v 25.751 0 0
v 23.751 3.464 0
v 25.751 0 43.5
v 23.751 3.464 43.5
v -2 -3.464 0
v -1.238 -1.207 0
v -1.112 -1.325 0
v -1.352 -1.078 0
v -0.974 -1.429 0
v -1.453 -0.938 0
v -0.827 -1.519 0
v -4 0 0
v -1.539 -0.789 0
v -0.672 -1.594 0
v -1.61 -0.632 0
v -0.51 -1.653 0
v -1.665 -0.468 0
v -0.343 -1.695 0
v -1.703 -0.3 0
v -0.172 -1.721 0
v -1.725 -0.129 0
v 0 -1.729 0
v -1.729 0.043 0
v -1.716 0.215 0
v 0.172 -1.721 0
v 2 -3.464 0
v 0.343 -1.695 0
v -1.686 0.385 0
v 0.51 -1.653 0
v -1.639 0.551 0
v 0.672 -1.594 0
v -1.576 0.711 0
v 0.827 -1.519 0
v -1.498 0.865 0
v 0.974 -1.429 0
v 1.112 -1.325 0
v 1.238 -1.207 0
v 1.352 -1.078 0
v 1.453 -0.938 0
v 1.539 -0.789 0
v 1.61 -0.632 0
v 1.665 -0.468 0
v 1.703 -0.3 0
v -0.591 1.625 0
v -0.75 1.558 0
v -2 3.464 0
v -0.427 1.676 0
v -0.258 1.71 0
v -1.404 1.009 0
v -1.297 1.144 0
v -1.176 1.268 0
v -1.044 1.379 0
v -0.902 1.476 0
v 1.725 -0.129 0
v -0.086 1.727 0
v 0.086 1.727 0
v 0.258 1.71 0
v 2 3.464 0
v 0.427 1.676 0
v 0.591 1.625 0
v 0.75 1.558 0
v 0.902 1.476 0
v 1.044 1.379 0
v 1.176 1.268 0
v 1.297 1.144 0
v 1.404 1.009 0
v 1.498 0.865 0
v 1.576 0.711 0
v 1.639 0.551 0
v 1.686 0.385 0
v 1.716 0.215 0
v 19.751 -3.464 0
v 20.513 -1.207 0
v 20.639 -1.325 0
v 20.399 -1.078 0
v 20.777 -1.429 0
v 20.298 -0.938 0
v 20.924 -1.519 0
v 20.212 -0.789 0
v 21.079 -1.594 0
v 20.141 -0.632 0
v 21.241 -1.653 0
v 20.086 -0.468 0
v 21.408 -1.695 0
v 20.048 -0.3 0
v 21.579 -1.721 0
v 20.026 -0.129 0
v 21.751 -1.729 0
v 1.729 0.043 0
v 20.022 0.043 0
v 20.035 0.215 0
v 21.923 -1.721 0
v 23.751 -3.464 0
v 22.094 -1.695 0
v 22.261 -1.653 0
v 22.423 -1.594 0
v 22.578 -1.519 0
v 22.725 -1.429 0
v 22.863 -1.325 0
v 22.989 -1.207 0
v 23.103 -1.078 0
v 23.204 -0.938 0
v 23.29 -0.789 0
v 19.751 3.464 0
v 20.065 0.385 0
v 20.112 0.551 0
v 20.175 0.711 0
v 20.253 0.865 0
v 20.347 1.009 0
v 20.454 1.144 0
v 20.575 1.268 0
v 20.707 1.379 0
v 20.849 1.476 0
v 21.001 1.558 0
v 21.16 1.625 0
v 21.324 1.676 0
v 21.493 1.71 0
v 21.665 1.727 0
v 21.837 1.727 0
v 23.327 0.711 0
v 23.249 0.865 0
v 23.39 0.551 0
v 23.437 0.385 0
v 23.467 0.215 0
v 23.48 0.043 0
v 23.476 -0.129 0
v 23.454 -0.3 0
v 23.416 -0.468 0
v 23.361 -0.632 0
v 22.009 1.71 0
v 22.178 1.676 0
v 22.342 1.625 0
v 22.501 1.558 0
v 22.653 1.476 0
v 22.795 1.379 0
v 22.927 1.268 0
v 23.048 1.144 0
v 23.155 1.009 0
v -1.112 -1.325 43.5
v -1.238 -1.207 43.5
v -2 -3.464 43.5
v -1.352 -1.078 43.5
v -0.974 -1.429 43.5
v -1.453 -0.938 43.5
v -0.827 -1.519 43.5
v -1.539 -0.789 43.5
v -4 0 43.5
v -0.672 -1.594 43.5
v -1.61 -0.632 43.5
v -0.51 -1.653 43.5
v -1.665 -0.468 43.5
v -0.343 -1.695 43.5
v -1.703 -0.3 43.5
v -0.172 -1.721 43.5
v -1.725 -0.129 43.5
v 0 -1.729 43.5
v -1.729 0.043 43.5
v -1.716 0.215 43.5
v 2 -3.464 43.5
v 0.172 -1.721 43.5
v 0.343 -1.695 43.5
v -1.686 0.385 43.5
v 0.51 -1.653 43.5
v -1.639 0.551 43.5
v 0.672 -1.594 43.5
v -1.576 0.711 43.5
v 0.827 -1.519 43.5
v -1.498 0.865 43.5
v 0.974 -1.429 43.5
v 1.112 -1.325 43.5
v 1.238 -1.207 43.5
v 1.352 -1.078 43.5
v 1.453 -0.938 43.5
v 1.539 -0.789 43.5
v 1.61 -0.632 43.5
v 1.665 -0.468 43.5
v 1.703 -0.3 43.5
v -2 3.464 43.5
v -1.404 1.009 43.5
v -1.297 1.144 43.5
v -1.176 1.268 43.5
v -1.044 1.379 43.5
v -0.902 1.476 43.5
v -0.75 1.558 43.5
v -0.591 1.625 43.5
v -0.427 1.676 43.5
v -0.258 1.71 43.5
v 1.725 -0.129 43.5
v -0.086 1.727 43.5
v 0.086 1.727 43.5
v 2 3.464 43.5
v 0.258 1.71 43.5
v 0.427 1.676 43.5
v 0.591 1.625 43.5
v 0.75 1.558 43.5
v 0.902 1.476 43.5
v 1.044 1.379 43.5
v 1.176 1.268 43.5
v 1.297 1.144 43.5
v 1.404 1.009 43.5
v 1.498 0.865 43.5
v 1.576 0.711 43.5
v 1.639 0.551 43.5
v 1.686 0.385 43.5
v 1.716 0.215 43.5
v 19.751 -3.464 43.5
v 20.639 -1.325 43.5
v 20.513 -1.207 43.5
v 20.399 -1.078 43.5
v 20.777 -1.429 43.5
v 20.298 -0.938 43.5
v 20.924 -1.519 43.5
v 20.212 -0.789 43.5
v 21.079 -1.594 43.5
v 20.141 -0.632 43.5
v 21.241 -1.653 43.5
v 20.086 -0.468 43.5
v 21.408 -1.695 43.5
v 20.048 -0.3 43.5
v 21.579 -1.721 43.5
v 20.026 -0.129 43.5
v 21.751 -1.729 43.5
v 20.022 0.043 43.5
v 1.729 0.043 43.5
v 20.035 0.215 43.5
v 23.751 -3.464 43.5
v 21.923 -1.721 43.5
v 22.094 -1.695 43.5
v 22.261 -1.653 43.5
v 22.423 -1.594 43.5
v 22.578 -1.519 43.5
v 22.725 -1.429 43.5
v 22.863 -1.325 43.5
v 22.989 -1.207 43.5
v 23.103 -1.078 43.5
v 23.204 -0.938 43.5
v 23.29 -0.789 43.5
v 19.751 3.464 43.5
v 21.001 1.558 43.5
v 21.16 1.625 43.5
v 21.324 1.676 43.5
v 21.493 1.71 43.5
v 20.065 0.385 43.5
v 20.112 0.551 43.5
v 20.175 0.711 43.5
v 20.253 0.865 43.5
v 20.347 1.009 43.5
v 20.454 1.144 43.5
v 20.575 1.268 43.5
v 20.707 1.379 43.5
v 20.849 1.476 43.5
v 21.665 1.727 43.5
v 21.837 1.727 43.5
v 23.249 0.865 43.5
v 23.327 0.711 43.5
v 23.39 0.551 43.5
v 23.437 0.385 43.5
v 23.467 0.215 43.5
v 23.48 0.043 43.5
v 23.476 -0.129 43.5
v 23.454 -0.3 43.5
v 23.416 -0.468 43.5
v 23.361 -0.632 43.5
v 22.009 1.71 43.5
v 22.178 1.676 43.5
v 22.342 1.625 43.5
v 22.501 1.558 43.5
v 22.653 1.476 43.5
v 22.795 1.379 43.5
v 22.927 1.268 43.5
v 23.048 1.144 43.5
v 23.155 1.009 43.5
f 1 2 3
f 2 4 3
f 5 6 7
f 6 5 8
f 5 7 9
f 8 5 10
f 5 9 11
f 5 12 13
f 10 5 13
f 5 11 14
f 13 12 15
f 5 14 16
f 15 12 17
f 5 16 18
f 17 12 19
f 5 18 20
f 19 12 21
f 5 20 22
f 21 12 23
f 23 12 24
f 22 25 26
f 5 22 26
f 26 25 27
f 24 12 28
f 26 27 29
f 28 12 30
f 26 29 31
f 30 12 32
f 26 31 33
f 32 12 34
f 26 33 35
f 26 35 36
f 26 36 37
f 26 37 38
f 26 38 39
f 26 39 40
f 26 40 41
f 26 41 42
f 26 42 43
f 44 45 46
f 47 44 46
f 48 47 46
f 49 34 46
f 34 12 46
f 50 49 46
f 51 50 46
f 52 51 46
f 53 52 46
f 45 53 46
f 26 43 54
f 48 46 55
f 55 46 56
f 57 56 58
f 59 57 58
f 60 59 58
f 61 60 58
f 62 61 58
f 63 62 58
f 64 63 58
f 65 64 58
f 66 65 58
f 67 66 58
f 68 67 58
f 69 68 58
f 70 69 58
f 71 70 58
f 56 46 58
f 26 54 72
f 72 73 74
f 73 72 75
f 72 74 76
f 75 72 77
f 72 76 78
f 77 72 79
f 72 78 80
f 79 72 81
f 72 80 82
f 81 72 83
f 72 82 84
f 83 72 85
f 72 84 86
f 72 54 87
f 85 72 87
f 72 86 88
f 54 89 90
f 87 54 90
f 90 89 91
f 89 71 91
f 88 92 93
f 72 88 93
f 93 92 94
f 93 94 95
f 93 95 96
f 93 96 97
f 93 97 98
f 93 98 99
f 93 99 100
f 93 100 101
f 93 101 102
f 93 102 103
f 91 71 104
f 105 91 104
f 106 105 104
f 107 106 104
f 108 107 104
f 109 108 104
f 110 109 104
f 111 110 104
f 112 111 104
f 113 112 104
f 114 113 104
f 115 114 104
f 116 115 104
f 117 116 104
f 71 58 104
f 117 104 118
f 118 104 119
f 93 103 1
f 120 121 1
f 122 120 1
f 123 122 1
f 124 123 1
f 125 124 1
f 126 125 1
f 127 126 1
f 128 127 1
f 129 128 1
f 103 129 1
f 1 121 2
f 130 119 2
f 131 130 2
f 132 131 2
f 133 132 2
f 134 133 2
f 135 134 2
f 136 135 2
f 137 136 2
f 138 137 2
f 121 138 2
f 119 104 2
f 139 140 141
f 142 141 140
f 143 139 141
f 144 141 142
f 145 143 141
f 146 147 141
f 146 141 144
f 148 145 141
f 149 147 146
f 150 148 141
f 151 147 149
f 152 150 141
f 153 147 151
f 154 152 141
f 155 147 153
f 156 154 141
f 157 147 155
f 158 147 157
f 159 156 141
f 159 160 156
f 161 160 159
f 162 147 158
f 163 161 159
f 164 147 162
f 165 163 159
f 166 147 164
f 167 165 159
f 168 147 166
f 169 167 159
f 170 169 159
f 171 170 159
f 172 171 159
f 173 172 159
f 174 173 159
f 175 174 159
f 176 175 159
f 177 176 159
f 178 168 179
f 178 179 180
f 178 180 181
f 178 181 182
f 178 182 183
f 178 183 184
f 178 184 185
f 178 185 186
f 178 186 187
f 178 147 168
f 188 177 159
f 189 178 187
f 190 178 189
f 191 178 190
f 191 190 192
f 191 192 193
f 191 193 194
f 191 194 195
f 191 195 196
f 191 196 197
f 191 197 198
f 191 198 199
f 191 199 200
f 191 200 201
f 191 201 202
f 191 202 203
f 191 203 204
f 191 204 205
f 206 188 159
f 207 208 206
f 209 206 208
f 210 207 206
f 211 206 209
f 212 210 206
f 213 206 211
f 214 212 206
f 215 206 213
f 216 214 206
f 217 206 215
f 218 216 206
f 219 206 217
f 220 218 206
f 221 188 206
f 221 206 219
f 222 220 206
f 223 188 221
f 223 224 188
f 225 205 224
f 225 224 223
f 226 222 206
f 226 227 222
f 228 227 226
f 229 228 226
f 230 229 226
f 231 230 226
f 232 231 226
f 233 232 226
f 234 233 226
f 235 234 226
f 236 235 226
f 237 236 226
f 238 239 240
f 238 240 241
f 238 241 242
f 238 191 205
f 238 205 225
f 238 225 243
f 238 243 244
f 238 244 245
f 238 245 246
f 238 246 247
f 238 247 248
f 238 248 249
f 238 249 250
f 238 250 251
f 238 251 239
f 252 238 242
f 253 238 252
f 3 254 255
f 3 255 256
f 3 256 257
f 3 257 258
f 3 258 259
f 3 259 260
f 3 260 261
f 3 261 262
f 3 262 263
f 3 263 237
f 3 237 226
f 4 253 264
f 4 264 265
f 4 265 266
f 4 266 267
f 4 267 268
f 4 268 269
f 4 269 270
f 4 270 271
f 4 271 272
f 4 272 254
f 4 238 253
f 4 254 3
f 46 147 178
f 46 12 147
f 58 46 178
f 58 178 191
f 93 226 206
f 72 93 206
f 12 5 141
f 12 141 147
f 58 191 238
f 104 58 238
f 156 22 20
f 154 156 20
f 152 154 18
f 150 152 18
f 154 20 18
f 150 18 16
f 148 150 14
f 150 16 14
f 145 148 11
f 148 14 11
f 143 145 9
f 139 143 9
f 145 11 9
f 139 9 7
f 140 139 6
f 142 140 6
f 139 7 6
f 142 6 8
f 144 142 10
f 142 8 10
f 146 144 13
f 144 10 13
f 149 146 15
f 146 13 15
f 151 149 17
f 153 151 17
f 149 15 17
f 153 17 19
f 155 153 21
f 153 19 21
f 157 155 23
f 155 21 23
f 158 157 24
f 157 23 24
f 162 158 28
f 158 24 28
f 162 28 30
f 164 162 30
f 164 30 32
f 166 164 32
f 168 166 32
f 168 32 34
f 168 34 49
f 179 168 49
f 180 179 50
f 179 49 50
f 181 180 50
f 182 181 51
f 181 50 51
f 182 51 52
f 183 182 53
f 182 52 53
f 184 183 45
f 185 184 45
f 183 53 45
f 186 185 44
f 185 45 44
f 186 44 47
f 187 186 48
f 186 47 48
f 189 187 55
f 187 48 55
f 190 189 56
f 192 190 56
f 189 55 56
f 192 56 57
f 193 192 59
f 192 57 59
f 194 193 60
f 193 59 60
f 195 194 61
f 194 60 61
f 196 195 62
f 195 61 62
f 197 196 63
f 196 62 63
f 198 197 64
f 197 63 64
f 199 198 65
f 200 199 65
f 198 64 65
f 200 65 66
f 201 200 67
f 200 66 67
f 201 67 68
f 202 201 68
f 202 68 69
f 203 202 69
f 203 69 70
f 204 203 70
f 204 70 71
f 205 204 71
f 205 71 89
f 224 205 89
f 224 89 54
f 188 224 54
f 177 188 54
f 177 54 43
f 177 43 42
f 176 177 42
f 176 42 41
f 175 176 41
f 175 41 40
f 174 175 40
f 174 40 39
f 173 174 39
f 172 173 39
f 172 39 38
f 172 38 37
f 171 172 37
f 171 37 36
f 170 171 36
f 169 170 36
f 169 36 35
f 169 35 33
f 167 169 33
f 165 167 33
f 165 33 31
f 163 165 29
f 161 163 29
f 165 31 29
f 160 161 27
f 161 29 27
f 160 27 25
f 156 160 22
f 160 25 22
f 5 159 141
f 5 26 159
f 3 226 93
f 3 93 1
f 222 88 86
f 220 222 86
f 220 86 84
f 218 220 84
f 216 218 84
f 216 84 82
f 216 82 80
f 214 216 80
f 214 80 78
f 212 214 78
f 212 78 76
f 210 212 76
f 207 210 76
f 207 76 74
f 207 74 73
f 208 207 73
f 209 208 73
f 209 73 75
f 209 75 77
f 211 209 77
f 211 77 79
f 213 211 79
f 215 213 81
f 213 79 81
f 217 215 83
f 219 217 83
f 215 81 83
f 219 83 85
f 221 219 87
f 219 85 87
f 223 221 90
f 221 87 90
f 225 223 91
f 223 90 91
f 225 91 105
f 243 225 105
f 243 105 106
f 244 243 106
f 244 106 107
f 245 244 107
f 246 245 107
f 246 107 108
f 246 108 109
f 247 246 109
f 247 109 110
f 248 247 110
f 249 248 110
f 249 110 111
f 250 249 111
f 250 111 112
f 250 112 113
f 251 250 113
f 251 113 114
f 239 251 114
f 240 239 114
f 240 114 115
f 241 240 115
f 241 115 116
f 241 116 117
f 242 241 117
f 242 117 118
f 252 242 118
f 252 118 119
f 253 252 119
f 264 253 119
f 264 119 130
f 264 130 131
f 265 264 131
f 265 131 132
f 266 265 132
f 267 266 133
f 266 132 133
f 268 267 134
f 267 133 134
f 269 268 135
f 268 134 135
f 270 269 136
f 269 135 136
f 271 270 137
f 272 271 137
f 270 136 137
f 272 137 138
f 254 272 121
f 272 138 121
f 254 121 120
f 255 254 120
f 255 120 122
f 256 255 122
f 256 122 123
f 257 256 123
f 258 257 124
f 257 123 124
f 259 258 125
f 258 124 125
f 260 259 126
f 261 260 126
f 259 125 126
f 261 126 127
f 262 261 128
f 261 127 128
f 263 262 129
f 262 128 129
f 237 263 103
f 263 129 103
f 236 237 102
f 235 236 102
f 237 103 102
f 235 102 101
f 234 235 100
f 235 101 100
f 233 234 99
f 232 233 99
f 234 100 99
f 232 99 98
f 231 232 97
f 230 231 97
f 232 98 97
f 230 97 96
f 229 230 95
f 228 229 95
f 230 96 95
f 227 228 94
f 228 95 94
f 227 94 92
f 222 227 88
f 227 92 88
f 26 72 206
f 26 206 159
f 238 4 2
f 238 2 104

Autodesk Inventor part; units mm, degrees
sketch "Sketch2" plane through (0, 0, 0) normal (0, 0, 1) x (1, 0, 0)
  line L0 (0, 2.8582) -> (0, -2.8582) construction
  line L1 (-5.7775, 0) -> (5.7775, 0) construction
  line L2 (0, 0) -> (4, 0)
  line L3 (4, 0) -> (-4, 0)
  circle A0 centre (0, 0) radius 4
  line L4 (0, 0) -> (-2, 3.4641)
  line L5 (0, 0) -> (4, 0) construction
  line L6 (0, 0) -> (2, 3.4641)
  line L7 (0, 0) -> (4, 0) construction
  line L8 (0, 0) -> (4, 0)
  line L9 (0, 0) -> (2, -3.4641)
  line L10 (0, 0) -> (-2, -3.4641)
  line L11 (-2, 3.4641) -> (2, 3.4641)
  line L12 (2, 3.4641) -> (4, 0)
  line L13 (4, 0) -> (2, -3.4641)
  line L14 (2, -3.4641) -> (-2, -3.4641)
  line L15 (-2, -3.4641) -> (-4, 0)
  line L16 (-4, 0) -> (-2, 3.4641)
  dimension "d3" = 4
  dimension "d2" = 8
  dimension "d1" = 120
  dimension "d0" = 60
extrude "Extrusion1" add sketch "Sketch2" along normal blind 43.5 contours L6 L12 L2 | L10 L15 L3 | L3 L16 L4 | L4 L11 L6 | L2 L13 L9 | L9 L14 L10
sketch "Sketch3" plane through (0, 0, 43.5) normal (0, 0, 1) x (1, 0, 0)
  point P0 (0, 0)
  point P1 (0, 0)
hole "Hole1" at (0, 0, 43.5) direction (0, 0, -1) diameter 3.4587 depth 44 thread size "M4x0.5" class "6H" standard "ISO Metric profile"
sketch "Sketch5" plane through (0, 0, 43.5) normal (0, 0, 1) x (1, 0, 0)
  line L0 (0, 0) -> (21.751, 0)
  line L1 (21.751, 0) -> (25.751, 0)
  line L2 (21.751, 0) -> (21.751, 3.464)
  line L3 (21.751, 3.464) -> (23.751, 3.464)
  line L4 (23.751, 3.464) -> (25.751, 0)
  line L5 (21.751, 3.464) -> (19.751, 3.464)
  line L6 (21.751, 0) -> (17.751, 0)
  line L7 (17.751, 0) -> (19.751, 3.464)
  line L8 (21.751, 0) -> (21.751, -3.464)
  line L9 (21.751, -3.464) -> (23.751, -3.464)
  line L10 (23.751, -3.464) -> (25.751, 0)
  line L11 (21.751, -3.464) -> (19.751, -3.464)
  line L12 (19.751, -3.464) -> (17.751, 0)
  line L13 (2, 3.4641) -> (-2, 3.4641) projected
  line L14 (0, 3.4641) -> (21.751, 3.464)
  line L15 (21.751, -3.464) -> (0, -3.4641)
  line L16 (-2, -3.4641) -> (2, -3.4641) projected
  line L17 (4, 0) -> (2, 3.4641) projected
  line L18 (0, 3.4641) -> (4, 0)
  line L19 (4, 0) -> (0, -3.4641)
  point P0 (2, 3.4641)
  point P1 (63.19, -3.464)
  point P2 (63.19, 3.464)
  dimension "d29" = 21.751
  dimension "d28" = 4
  dimension "d27" = 3.464
  dimension "d26" = 2
  dimension "d25" = 2
  dimension "d24" = 4
  dimension "d23" = 3.464
  dimension "d22" = 2
  dimension "d21" = 2
extrude "Extrusion2" add sketch "Sketch5" against normal blind 43.5
sketch "Sketch6" plane through (0, 0, 43.5) normal (0, 0, 1) x (1, 0, 0)
  line L0 (0, 0) -> (21.751, 0)
  dimension "d34" = 21.751
hole "Hole3" at (21.751, 0, 43.5) direction (0, 0, -1) diameter 3.4587 depth 44 thread size "M4x0.5" class "6H" standard "ISO Metric profile"
properties part number "Steunstuk kort" material "S235"
